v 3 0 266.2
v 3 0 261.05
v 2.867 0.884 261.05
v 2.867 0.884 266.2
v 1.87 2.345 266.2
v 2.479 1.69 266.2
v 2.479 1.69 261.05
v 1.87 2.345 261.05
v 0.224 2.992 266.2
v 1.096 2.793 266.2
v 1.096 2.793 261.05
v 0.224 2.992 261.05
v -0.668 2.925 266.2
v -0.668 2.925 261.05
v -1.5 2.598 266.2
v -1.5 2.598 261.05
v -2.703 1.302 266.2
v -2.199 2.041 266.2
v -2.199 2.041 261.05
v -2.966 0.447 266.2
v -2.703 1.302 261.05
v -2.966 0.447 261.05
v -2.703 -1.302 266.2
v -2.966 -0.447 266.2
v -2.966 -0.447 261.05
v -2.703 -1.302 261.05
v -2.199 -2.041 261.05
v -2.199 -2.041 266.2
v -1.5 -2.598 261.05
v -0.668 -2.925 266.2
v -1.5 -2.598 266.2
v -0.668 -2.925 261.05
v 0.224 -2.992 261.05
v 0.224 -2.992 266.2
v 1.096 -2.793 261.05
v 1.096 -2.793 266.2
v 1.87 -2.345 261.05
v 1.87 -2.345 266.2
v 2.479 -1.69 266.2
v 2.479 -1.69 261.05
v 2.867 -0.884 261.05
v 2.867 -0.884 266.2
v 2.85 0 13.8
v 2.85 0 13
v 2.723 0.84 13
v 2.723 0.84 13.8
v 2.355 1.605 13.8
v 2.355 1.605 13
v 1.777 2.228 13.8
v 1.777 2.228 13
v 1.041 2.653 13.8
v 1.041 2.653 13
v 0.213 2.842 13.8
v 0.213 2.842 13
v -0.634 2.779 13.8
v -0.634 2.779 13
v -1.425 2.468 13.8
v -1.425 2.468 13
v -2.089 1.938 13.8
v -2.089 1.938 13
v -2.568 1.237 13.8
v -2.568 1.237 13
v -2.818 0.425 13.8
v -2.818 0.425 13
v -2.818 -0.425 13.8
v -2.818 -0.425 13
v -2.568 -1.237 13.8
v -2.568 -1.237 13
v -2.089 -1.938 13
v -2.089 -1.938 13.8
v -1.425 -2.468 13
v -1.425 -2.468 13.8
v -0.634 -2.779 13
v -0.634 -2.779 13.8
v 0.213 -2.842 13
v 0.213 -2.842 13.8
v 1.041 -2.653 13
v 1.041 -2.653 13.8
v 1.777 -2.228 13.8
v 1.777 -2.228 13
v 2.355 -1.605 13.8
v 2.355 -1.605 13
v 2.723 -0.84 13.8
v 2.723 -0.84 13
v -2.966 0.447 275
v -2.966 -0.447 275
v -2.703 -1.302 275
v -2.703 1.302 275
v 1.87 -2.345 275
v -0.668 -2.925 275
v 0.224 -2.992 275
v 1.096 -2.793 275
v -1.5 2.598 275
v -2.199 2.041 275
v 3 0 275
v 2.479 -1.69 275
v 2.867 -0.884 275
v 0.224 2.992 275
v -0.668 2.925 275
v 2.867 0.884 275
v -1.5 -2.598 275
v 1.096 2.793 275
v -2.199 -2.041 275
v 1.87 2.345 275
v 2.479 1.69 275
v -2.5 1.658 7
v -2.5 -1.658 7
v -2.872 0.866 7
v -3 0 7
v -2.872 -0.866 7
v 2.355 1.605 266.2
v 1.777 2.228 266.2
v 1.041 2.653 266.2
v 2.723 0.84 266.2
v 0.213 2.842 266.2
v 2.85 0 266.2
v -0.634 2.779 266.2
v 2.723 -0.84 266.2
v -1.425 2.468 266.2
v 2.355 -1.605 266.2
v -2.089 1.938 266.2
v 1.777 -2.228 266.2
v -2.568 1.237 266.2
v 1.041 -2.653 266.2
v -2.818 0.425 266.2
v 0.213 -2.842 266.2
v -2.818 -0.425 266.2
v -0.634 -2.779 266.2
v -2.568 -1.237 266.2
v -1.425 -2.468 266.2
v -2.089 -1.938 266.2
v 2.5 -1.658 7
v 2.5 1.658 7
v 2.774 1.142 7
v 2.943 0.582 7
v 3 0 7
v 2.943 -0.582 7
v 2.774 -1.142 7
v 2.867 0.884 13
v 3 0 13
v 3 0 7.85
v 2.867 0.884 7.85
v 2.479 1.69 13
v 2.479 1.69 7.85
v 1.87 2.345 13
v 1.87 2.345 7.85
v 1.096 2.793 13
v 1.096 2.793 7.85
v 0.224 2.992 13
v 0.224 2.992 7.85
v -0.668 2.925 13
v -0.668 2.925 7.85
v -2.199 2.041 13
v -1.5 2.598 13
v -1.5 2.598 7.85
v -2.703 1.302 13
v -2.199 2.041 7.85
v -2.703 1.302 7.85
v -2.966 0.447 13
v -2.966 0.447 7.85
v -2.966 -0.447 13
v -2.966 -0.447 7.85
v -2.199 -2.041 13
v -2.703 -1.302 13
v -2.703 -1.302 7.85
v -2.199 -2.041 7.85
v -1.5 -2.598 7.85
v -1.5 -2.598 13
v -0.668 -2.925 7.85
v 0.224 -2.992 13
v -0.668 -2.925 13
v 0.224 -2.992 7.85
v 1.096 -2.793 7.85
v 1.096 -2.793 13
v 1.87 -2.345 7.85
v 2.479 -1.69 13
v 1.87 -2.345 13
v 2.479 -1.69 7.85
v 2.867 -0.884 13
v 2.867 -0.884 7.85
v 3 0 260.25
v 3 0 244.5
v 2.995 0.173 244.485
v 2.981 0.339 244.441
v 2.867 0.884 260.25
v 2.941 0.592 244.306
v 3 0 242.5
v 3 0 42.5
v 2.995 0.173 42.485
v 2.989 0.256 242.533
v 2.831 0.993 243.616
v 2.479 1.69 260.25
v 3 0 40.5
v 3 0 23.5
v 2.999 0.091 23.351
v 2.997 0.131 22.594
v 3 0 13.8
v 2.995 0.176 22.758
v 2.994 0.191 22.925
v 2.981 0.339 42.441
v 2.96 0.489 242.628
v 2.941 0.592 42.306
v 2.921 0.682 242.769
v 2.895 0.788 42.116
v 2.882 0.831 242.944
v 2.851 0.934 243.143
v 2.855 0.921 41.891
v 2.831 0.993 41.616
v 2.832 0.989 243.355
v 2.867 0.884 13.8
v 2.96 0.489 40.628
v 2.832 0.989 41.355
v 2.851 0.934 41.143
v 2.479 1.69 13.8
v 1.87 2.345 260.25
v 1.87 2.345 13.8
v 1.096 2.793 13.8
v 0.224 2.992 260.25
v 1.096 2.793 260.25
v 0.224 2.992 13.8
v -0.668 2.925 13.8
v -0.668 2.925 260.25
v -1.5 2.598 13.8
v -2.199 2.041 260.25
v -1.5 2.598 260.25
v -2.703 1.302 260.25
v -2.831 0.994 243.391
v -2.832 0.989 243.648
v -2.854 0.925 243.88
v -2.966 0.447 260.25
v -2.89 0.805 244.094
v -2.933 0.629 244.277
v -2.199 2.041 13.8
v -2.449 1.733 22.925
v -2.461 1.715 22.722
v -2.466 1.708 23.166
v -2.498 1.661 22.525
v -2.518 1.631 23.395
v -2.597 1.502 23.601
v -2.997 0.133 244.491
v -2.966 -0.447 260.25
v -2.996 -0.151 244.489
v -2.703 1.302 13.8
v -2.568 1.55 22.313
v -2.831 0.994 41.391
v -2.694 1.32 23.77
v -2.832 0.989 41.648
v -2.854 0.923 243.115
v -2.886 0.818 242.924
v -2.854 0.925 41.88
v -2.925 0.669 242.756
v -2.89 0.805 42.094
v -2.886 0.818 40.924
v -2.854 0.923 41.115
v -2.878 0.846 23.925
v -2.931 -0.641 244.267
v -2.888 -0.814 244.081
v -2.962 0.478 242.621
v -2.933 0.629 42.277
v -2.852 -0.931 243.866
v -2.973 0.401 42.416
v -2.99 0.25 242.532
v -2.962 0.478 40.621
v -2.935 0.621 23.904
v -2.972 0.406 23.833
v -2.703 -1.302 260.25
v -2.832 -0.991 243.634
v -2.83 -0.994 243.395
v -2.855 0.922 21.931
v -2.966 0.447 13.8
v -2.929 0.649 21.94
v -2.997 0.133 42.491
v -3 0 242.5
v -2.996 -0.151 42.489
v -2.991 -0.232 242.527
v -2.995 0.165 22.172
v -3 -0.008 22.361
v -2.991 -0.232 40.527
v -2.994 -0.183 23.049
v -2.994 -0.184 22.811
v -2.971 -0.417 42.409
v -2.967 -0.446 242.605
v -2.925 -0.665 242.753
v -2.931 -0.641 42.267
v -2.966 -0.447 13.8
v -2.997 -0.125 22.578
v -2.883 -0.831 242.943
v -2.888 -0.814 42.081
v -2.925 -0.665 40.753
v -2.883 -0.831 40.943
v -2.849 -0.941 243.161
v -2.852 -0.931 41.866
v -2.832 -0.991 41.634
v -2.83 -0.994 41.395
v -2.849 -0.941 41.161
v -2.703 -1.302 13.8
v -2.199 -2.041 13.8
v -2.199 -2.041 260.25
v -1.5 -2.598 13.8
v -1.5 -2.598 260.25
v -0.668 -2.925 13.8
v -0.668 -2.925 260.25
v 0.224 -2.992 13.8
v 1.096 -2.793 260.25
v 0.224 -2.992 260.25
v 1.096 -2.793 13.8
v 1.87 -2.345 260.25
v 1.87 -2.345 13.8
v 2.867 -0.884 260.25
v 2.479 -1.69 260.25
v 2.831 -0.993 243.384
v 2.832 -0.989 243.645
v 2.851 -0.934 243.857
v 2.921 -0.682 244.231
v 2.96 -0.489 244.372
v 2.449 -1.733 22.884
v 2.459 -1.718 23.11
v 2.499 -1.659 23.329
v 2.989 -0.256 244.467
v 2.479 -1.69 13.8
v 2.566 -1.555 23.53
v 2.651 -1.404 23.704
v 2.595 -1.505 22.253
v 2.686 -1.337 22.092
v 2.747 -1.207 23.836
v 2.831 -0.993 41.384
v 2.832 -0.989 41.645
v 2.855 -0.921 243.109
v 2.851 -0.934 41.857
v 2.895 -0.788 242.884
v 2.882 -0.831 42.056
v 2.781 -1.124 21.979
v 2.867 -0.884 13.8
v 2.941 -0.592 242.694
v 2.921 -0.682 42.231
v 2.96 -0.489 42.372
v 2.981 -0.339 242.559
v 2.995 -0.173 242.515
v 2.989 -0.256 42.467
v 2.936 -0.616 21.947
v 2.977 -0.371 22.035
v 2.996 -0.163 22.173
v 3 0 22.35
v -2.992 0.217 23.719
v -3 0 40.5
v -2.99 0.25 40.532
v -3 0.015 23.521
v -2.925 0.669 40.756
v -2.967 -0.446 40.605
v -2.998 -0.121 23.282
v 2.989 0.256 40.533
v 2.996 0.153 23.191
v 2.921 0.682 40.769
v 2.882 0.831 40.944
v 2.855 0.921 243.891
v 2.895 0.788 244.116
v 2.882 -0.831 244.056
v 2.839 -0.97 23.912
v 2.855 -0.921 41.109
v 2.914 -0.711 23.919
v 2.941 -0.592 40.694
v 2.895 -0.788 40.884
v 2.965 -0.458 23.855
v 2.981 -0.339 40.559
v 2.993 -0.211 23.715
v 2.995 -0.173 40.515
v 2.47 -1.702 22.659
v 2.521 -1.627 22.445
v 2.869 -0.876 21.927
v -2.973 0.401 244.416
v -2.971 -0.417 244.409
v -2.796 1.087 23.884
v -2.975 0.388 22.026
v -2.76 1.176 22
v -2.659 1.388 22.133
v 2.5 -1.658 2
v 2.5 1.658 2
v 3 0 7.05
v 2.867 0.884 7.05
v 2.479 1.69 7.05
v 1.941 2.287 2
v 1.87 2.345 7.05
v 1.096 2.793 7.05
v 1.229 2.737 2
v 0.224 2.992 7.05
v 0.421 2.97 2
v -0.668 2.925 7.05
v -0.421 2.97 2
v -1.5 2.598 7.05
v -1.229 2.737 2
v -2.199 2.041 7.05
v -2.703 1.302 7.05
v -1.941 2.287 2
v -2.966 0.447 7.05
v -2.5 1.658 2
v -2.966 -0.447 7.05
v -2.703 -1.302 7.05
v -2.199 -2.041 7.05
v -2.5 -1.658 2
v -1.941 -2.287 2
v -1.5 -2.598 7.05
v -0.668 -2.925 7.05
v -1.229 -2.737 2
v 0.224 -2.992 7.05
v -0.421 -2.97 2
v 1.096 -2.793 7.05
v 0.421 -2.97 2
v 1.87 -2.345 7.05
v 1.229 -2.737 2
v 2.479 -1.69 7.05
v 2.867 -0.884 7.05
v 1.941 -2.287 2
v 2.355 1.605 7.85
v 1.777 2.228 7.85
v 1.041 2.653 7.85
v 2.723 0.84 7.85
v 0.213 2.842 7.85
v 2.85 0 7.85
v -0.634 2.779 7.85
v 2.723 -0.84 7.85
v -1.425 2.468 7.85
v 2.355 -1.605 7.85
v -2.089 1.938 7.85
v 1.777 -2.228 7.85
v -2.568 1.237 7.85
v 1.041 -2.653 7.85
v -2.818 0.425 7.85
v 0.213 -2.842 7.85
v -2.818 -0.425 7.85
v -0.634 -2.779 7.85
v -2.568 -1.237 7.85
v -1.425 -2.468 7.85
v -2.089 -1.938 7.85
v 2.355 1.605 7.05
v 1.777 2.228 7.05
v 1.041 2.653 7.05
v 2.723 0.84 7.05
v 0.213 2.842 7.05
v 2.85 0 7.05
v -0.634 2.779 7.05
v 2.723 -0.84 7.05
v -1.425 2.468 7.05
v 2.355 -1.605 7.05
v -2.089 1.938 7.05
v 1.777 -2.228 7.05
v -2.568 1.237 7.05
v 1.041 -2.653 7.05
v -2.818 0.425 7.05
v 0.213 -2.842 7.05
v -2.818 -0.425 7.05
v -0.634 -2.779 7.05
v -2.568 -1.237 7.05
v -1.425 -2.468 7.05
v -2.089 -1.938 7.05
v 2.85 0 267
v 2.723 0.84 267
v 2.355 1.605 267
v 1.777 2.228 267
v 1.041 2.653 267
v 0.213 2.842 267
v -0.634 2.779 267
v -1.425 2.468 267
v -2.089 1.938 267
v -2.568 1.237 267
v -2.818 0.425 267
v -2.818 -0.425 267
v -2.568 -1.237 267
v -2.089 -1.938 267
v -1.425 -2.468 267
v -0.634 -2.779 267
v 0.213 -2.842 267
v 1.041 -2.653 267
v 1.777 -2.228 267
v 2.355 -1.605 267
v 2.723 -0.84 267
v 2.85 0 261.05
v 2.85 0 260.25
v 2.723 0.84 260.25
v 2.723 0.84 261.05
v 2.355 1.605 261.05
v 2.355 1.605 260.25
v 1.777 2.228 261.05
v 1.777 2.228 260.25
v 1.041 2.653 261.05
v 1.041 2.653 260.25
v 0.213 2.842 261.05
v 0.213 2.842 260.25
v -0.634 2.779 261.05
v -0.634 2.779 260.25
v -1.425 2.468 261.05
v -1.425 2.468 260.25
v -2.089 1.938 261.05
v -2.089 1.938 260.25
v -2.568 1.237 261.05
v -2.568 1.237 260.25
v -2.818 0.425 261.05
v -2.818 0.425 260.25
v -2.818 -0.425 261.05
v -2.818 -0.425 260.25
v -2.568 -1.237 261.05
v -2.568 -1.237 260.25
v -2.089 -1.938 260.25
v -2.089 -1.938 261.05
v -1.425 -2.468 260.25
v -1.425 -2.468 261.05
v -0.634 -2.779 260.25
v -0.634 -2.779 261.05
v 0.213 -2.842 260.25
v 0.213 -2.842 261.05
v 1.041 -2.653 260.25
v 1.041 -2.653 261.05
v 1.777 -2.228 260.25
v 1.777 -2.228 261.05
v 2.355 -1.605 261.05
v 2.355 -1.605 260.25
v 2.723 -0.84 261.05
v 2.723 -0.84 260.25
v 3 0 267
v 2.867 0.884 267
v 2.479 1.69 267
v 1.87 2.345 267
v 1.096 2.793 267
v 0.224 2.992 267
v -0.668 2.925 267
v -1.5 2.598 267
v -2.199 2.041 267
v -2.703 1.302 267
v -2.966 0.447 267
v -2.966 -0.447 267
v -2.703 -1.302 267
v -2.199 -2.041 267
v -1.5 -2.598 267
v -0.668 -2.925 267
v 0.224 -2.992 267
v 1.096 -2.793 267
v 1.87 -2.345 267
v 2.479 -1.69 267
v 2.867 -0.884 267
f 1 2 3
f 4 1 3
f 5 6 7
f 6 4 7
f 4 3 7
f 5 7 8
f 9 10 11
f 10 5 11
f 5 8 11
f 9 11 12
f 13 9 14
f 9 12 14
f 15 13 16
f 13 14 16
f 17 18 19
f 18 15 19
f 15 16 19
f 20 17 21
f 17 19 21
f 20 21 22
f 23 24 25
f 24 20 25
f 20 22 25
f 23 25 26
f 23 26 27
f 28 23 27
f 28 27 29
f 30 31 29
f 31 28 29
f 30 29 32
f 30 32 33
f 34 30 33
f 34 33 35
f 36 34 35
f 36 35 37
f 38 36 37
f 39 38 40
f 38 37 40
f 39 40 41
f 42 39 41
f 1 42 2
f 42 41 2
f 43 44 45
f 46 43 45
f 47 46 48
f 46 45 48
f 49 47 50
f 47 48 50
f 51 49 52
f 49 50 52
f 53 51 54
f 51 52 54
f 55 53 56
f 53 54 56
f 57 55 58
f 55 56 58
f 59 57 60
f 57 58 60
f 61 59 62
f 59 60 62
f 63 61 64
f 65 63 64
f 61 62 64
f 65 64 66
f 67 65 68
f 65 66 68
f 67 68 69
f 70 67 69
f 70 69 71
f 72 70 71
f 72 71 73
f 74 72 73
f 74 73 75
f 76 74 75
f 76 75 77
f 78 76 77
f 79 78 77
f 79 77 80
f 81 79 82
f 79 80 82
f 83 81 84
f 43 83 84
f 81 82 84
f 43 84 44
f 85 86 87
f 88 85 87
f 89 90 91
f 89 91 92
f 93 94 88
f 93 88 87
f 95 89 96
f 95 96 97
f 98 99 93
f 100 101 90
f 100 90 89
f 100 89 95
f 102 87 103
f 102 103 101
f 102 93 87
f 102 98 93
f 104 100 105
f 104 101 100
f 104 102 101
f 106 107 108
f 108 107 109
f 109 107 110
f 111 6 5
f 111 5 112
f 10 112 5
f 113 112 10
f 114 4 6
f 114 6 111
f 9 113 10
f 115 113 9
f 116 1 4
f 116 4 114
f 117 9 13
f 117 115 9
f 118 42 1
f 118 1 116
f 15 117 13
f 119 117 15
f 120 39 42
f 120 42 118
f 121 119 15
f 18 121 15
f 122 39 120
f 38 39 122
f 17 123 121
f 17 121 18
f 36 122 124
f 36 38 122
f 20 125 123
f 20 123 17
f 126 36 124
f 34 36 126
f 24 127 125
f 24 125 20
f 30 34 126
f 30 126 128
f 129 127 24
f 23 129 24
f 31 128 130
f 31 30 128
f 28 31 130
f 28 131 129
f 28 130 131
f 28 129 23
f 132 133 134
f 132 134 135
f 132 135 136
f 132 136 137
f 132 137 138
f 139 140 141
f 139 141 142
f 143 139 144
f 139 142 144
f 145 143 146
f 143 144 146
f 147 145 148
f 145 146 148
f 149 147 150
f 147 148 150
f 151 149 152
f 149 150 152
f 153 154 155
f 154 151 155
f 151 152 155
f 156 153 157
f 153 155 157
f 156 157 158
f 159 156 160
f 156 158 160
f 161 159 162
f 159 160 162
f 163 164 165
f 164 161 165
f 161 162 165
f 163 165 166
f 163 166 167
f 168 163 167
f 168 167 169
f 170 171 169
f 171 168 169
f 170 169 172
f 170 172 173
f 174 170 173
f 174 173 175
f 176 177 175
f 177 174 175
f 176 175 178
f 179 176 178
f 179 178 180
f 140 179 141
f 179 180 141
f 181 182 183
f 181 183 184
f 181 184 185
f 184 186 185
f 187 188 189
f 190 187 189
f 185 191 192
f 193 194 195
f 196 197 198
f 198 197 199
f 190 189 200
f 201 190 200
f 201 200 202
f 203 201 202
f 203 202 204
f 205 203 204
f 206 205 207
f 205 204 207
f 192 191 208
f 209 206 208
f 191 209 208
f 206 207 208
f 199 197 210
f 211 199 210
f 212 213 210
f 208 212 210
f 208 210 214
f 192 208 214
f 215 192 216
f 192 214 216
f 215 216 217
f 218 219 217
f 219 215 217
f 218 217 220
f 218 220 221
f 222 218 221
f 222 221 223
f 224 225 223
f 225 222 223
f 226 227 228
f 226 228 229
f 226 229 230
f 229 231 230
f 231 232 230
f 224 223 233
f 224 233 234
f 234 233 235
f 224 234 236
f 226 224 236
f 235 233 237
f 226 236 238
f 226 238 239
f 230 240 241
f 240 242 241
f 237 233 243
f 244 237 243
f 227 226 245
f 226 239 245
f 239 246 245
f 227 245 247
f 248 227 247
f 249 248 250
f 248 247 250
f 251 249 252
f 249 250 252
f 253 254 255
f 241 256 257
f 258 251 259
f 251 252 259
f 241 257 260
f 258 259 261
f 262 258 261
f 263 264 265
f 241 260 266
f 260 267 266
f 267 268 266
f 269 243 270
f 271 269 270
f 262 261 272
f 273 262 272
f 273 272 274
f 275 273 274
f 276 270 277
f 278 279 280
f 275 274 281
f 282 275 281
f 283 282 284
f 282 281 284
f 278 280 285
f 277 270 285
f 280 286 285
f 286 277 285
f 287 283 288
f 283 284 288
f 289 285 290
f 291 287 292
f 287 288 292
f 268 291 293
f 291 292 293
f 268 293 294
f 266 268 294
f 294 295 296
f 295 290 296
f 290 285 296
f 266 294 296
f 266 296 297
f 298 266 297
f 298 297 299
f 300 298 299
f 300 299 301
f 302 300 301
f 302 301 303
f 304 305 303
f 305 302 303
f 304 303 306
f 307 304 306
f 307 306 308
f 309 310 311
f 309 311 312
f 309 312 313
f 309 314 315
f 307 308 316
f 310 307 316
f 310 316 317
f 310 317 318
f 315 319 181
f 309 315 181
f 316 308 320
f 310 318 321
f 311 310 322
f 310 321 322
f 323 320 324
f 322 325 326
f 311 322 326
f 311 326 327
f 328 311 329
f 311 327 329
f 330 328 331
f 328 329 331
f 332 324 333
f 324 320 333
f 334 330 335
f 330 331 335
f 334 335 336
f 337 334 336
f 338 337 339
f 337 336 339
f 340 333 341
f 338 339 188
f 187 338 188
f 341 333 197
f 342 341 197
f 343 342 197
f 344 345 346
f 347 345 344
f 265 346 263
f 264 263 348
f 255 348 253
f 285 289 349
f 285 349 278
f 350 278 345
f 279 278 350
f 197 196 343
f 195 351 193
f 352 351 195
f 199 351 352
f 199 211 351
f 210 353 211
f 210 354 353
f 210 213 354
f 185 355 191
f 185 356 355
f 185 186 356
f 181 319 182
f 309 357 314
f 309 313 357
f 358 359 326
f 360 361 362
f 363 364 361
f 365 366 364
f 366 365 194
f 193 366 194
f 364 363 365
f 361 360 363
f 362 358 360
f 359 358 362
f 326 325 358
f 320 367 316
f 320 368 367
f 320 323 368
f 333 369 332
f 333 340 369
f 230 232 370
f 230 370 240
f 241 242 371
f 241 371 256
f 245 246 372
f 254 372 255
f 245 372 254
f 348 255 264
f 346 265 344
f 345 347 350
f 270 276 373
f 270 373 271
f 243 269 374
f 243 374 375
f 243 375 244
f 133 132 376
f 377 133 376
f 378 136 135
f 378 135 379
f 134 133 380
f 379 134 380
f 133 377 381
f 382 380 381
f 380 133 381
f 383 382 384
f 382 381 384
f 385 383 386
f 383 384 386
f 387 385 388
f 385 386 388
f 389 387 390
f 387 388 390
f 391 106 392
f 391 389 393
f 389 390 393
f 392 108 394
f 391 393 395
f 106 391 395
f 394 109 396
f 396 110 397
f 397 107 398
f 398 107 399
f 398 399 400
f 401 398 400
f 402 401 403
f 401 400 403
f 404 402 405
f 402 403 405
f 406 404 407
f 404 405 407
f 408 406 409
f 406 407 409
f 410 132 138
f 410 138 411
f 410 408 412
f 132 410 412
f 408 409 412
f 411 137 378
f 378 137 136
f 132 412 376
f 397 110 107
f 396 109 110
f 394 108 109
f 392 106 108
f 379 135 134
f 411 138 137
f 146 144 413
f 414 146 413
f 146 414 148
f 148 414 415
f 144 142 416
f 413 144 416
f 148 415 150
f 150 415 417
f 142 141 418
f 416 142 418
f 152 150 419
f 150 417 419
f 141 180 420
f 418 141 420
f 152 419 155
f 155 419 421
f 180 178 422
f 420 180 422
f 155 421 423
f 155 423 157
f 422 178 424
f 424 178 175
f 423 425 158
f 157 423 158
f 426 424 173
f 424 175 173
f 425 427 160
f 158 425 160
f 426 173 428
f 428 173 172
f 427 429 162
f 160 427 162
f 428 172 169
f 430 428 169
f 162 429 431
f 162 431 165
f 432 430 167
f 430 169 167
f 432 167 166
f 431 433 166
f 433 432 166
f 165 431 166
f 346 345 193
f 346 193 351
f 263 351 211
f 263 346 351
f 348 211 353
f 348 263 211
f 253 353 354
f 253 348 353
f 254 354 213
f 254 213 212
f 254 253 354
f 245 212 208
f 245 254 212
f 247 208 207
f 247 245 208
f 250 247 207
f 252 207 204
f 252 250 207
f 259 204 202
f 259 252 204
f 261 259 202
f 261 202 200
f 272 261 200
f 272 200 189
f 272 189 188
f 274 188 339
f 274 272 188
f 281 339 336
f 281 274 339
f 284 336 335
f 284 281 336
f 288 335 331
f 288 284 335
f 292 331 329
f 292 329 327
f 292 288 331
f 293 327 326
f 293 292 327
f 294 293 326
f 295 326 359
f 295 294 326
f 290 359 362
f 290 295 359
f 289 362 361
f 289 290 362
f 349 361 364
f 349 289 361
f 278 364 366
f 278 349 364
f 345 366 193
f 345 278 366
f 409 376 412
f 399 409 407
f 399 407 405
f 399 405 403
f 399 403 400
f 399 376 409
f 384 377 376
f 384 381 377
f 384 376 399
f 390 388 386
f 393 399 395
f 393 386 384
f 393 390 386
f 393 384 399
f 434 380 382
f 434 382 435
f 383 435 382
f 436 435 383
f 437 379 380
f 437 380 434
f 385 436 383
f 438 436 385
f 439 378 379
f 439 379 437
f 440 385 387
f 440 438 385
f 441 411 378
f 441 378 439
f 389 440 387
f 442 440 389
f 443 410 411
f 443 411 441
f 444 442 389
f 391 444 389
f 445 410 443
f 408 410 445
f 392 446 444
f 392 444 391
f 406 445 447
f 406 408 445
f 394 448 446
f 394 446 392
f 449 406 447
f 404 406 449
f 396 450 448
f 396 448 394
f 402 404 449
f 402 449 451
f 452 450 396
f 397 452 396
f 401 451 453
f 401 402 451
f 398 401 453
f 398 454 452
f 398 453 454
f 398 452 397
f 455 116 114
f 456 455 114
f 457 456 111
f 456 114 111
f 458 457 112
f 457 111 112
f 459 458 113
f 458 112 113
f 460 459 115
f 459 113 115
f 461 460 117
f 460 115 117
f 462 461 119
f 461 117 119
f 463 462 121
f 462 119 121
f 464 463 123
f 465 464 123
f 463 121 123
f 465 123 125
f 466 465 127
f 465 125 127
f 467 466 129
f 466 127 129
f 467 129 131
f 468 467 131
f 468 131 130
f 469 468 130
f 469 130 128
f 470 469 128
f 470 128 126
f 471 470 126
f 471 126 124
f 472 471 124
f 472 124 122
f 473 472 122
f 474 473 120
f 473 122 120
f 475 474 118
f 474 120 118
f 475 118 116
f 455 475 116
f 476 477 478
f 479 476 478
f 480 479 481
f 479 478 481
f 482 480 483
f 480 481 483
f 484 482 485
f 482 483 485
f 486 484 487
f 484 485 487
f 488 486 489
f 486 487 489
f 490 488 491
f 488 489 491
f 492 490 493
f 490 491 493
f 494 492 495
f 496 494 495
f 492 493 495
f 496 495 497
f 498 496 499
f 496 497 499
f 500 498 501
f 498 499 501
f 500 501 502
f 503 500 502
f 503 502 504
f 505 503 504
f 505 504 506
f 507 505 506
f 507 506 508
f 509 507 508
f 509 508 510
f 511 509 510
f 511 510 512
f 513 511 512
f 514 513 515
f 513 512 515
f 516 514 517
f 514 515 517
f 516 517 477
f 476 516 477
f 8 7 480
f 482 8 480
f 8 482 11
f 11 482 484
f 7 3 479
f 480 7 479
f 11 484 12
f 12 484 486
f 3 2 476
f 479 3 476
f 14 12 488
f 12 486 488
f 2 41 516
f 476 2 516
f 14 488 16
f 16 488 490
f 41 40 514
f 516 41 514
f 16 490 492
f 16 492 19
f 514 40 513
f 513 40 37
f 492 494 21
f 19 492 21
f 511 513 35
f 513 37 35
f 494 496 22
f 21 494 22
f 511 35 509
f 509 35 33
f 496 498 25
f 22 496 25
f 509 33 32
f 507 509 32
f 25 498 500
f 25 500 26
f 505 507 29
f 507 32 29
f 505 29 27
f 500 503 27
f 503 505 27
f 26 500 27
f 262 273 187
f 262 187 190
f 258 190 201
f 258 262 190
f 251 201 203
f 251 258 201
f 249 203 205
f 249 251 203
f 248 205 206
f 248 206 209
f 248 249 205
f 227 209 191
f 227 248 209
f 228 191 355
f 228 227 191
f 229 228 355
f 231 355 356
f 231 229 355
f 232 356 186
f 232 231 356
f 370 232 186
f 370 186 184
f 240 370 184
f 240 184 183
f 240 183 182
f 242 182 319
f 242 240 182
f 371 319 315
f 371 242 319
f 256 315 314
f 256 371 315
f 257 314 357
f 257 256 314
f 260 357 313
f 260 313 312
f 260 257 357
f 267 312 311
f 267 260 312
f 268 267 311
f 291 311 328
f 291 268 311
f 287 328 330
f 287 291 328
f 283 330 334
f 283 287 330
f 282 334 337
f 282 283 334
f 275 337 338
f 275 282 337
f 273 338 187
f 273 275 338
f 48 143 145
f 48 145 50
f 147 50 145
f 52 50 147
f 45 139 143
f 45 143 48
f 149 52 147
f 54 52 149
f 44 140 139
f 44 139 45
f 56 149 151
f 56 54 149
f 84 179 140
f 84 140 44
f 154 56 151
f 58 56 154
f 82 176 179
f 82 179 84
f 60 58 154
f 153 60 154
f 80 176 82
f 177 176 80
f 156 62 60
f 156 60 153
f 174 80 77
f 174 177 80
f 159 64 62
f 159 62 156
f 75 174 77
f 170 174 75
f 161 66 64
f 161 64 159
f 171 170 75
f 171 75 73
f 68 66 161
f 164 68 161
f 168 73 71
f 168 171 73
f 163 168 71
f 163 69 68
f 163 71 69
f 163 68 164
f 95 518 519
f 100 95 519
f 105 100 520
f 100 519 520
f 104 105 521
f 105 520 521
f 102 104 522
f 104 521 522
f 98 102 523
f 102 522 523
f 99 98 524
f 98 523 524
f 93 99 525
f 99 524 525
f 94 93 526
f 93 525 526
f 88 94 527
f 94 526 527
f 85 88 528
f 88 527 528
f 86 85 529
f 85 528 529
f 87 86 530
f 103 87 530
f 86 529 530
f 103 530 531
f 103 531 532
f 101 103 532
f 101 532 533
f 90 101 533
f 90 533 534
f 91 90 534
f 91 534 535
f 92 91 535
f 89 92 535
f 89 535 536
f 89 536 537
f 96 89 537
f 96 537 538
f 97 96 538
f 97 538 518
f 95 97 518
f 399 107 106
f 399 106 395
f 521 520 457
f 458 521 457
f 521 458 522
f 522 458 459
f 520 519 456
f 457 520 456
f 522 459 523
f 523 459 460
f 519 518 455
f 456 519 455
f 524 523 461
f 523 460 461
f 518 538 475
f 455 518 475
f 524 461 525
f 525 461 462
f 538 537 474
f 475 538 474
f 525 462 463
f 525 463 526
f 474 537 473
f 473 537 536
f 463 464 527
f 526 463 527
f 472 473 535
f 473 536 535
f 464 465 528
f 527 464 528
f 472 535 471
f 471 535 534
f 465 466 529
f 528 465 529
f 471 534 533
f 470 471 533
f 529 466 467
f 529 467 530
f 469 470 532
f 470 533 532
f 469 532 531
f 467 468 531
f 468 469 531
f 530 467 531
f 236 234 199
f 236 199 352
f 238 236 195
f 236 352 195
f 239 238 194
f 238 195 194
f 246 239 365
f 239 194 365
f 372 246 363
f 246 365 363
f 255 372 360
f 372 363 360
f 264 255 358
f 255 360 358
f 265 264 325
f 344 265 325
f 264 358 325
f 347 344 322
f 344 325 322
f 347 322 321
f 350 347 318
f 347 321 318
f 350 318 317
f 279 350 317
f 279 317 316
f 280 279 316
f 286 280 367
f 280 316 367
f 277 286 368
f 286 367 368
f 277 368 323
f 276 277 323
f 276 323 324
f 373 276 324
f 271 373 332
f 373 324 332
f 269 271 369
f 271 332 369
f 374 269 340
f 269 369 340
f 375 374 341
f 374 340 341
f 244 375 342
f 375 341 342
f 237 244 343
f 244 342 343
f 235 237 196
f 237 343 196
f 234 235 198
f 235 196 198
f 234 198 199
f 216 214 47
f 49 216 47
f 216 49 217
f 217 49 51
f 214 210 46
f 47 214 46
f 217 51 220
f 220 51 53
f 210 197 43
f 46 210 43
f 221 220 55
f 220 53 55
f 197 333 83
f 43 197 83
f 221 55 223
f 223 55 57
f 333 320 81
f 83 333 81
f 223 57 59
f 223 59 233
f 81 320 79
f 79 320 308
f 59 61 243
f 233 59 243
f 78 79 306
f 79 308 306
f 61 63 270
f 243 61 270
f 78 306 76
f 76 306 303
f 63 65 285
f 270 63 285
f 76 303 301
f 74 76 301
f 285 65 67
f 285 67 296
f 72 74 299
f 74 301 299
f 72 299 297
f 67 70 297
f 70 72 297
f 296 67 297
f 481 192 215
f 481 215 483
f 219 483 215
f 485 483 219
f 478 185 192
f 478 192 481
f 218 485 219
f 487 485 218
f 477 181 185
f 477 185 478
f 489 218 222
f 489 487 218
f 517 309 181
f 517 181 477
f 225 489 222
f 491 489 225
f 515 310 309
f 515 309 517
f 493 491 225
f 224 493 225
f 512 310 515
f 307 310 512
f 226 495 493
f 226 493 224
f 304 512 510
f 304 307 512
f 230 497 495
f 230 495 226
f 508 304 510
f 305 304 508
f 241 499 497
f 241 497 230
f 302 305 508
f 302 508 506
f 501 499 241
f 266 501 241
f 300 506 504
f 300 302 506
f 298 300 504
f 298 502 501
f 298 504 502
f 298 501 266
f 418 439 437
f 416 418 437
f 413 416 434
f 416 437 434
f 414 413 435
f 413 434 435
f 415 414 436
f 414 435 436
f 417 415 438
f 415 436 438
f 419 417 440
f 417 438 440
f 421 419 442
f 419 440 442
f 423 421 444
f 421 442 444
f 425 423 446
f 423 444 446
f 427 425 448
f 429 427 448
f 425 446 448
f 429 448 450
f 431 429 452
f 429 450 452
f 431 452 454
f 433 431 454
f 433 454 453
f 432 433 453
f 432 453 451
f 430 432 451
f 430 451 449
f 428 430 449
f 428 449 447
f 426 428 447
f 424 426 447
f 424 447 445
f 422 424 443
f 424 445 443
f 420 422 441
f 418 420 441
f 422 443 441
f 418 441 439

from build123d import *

# Parameters (mm, degrees)
SKETCH1_R                                  = 3
BOSS_EXTRUDE1_DEPTH                        = 275
SKETCH3_W                                  = 0.8
SKETCH3_H                                  = 0.5
CUT_EXTRUDE2_DEPTH                         = 276.032725326
CUT_EXTRUDE2_DEPTH_BACK                    = 276.032725326
SKETCH4_W                                  = 3.470061058
SKETCH4_H                                  = 7
SKETCH4_W_2                                = 2.92528695
CHAMFER1_SIZE                              = 0.3
RETAINING_GROOVES_D5P7_1_START             = 7.05
SKETCH5_R                                  = 2.85
SKETCH5_R_2                                = 2.49
RETAINING_GROOVES_D5P7_1_DEPTH             = 0.8
RETAINING_GROOVES_D5P7_2_START             = 13
SKETCH6_R                                  = 2.85
SKETCH6_R_2                                = 2.49
RETAINING_GROOVES_D5P7_2_DEPTH             = 0.8
RETAINING_GROOVES_D5P7_3_START             = 260.25
SKETCH7_R                                  = 2.85
SKETCH7_R_2                                = 2.49
RETAINING_GROOVES_D5P7_3_DEPTH             = 0.8
RETAINING_GROOVES_D5P7_4_START             = 266.2
SKETCH8_R                                  = 2.85
SKETCH8_R_2                                = 2.49
RETAINING_GROOVES_D5P7_4_DEPTH             = 0.8
TWO_HUB_CROSS_PIN_D2_DEPTH                 = 276.032725326
TWO_HUB_CROSS_PIN_D2_DEPTH_BACK            = 276.032725326
SKETCH9_R                                  = 1
SKETCH10_R                                 = 3.1
REVB_LOWER_SHAFT_NOSE_CLEARANCE_2MM_DEPTH  = 2
REVB_OLDHAM_D2_DRIVE_PIN_CLOCKED_HOLE_OU_W = 1
REVB_OLDHAM_D2_DRIVE_PIN_CLOCKED_HOLE_OU_H = 6.000106441


# Read off the part's stored shape, not the designer's step: RevB_Oldham_D2_Drive_Pin_Clocked_Hole
with BuildPart() as part:
    # Sketch1 → Boss-Extrude1 (new body)
    with BuildSketch(Plane.XY):
        Circle(SKETCH1_R)
    extrude(amount=BOSS_EXTRUDE1_DEPTH)

    # Sketch3 → Cut-Revolve1 (revolve, cut)
    with BuildSketch(Plane(origin=(0, 0, 0), x_dir=(0, 0, -1), z_dir=(1, 0, 0)), mode=Mode.PRIVATE) as cut_revolve1_sk:
        with Locations((-266.6, 2.75)):
            Rectangle(SKETCH3_W, SKETCH3_H)
        with Locations((-260.65, 2.75)):
            Rectangle(SKETCH3_W, SKETCH3_H)
        with Locations((-13.4, 2.75)):
            Rectangle(SKETCH3_W, SKETCH3_H)
        with Locations((-7.45, 2.75)):
            Rectangle(SKETCH3_W, SKETCH3_H)
    revolve(cut_revolve1_sk.sketch.rotate(Axis((0, 0, 263.365004794), (0, 0, -1)), 90), axis=Axis((0, 0, 263.365004794), (0, 0, -1)), mode=Mode.SUBTRACT)

    # Sketch4 → Cut-Extrude2 (cut, two sides: drawn at the far end of the back side and taken through both)
    with BuildSketch(Plane(origin=(0, 0, 0), x_dir=(1, 0, 0), z_dir=(0, 1, 0)).offset(-CUT_EXTRUDE2_DEPTH_BACK)):
        with Locations((4.235030529, -3.5)):
            Rectangle(SKETCH4_W, SKETCH4_H)
        with Locations((-3.962643475, -3.5)):
            Rectangle(SKETCH4_W_2, SKETCH4_H)
    extrude(amount=CUT_EXTRUDE2_DEPTH + CUT_EXTRUDE2_DEPTH_BACK, mode=Mode.SUBTRACT)

    # Chamfer1
    chamfer1_edges = [part.edges().sort_by_distance(p)[0] for p in [
        (0, 3, 0),
        (0, -3, 0),
    ]]
    chamfer(chamfer1_edges, length=CHAMFER1_SIZE)

    # Sketch5 → Retaining_Grooves_D5p7_1 (add)
    with BuildSketch(Plane.XY.offset(RETAINING_GROOVES_D5P7_1_START)):
        Circle(SKETCH5_R)
        Circle(SKETCH5_R_2, mode=Mode.SUBTRACT)
    extrude(amount=RETAINING_GROOVES_D5P7_1_DEPTH)

    # Sketch6 → Retaining_Grooves_D5p7_2 (add)
    with BuildSketch(Plane.XY.offset(RETAINING_GROOVES_D5P7_2_START)):
        Circle(SKETCH6_R)
        Circle(SKETCH6_R_2, mode=Mode.SUBTRACT)
    extrude(amount=RETAINING_GROOVES_D5P7_2_DEPTH)

    # Sketch7 → Retaining_Grooves_D5p7_3 (add)
    with BuildSketch(Plane.XY.offset(RETAINING_GROOVES_D5P7_3_START)):
        Circle(SKETCH7_R)
        Circle(SKETCH7_R_2, mode=Mode.SUBTRACT)
    extrude(amount=RETAINING_GROOVES_D5P7_3_DEPTH)

    # Sketch8 → Retaining_Grooves_D5p7_4 (add)
    with BuildSketch(Plane.XY.offset(RETAINING_GROOVES_D5P7_4_START)):
        Circle(SKETCH8_R)
        Circle(SKETCH8_R_2, mode=Mode.SUBTRACT)
    extrude(amount=RETAINING_GROOVES_D5P7_4_DEPTH)

    # Sketch9 → Two_Hub_Cross_Pin_D2 (cut, two sides: drawn at the far end of the back side and taken through both)
    with BuildSketch(Plane(origin=(0, 0, 0), x_dir=(0, 0, -1), z_dir=(1, 0, 0)).offset(-TWO_HUB_CROSS_PIN_D2_DEPTH_BACK)):
        with Locations((-41.5, 0)):
            Circle(SKETCH9_R)
        with Locations((-243.5, 0)):
            Circle(SKETCH9_R)
    extrude(amount=TWO_HUB_CROSS_PIN_D2_DEPTH + TWO_HUB_CROSS_PIN_D2_DEPTH_BACK, mode=Mode.SUBTRACT)

    # Sketch10 → RevB_Lower_Shaft_Nose_Clearance_2mm (cut)
    with BuildSketch(Plane(origin=(0, 0, 0), x_dir=(-1, 0, 0), z_dir=(0, 0, -1))):
        Circle(SKETCH10_R)
    extrude(amount=-REVB_LOWER_SHAFT_NOSE_CLEARANCE_2MM_DEPTH, mode=Mode.SUBTRACT)

    # RevB_Oldham_D2_Drive_Pin_Clocked_Hole ou → RevB_Oldham_D2_Drive_Pin_Clocked_Hole (revolve, cut)
    with BuildSketch(Plane(origin=(0, 0, 22.925), x_dir=(0.2727065426398811, 0.962097262027807, 0), z_dir=(0, 0, -1))):
        with Locations((0.5, 2.6843e-05)):
            Rectangle(REVB_OLDHAM_D2_DRIVE_PIN_CLOCKED_HOLE_OU_W, REVB_OLDHAM_D2_DRIVE_PIN_CLOCKED_HOLE_OU_H)
    revolve(axis=Axis((0, 0, 22.925), (0.962097262027807, -0.2727065426398811, 0)), mode=Mode.SUBTRACT)


solid = part.part
